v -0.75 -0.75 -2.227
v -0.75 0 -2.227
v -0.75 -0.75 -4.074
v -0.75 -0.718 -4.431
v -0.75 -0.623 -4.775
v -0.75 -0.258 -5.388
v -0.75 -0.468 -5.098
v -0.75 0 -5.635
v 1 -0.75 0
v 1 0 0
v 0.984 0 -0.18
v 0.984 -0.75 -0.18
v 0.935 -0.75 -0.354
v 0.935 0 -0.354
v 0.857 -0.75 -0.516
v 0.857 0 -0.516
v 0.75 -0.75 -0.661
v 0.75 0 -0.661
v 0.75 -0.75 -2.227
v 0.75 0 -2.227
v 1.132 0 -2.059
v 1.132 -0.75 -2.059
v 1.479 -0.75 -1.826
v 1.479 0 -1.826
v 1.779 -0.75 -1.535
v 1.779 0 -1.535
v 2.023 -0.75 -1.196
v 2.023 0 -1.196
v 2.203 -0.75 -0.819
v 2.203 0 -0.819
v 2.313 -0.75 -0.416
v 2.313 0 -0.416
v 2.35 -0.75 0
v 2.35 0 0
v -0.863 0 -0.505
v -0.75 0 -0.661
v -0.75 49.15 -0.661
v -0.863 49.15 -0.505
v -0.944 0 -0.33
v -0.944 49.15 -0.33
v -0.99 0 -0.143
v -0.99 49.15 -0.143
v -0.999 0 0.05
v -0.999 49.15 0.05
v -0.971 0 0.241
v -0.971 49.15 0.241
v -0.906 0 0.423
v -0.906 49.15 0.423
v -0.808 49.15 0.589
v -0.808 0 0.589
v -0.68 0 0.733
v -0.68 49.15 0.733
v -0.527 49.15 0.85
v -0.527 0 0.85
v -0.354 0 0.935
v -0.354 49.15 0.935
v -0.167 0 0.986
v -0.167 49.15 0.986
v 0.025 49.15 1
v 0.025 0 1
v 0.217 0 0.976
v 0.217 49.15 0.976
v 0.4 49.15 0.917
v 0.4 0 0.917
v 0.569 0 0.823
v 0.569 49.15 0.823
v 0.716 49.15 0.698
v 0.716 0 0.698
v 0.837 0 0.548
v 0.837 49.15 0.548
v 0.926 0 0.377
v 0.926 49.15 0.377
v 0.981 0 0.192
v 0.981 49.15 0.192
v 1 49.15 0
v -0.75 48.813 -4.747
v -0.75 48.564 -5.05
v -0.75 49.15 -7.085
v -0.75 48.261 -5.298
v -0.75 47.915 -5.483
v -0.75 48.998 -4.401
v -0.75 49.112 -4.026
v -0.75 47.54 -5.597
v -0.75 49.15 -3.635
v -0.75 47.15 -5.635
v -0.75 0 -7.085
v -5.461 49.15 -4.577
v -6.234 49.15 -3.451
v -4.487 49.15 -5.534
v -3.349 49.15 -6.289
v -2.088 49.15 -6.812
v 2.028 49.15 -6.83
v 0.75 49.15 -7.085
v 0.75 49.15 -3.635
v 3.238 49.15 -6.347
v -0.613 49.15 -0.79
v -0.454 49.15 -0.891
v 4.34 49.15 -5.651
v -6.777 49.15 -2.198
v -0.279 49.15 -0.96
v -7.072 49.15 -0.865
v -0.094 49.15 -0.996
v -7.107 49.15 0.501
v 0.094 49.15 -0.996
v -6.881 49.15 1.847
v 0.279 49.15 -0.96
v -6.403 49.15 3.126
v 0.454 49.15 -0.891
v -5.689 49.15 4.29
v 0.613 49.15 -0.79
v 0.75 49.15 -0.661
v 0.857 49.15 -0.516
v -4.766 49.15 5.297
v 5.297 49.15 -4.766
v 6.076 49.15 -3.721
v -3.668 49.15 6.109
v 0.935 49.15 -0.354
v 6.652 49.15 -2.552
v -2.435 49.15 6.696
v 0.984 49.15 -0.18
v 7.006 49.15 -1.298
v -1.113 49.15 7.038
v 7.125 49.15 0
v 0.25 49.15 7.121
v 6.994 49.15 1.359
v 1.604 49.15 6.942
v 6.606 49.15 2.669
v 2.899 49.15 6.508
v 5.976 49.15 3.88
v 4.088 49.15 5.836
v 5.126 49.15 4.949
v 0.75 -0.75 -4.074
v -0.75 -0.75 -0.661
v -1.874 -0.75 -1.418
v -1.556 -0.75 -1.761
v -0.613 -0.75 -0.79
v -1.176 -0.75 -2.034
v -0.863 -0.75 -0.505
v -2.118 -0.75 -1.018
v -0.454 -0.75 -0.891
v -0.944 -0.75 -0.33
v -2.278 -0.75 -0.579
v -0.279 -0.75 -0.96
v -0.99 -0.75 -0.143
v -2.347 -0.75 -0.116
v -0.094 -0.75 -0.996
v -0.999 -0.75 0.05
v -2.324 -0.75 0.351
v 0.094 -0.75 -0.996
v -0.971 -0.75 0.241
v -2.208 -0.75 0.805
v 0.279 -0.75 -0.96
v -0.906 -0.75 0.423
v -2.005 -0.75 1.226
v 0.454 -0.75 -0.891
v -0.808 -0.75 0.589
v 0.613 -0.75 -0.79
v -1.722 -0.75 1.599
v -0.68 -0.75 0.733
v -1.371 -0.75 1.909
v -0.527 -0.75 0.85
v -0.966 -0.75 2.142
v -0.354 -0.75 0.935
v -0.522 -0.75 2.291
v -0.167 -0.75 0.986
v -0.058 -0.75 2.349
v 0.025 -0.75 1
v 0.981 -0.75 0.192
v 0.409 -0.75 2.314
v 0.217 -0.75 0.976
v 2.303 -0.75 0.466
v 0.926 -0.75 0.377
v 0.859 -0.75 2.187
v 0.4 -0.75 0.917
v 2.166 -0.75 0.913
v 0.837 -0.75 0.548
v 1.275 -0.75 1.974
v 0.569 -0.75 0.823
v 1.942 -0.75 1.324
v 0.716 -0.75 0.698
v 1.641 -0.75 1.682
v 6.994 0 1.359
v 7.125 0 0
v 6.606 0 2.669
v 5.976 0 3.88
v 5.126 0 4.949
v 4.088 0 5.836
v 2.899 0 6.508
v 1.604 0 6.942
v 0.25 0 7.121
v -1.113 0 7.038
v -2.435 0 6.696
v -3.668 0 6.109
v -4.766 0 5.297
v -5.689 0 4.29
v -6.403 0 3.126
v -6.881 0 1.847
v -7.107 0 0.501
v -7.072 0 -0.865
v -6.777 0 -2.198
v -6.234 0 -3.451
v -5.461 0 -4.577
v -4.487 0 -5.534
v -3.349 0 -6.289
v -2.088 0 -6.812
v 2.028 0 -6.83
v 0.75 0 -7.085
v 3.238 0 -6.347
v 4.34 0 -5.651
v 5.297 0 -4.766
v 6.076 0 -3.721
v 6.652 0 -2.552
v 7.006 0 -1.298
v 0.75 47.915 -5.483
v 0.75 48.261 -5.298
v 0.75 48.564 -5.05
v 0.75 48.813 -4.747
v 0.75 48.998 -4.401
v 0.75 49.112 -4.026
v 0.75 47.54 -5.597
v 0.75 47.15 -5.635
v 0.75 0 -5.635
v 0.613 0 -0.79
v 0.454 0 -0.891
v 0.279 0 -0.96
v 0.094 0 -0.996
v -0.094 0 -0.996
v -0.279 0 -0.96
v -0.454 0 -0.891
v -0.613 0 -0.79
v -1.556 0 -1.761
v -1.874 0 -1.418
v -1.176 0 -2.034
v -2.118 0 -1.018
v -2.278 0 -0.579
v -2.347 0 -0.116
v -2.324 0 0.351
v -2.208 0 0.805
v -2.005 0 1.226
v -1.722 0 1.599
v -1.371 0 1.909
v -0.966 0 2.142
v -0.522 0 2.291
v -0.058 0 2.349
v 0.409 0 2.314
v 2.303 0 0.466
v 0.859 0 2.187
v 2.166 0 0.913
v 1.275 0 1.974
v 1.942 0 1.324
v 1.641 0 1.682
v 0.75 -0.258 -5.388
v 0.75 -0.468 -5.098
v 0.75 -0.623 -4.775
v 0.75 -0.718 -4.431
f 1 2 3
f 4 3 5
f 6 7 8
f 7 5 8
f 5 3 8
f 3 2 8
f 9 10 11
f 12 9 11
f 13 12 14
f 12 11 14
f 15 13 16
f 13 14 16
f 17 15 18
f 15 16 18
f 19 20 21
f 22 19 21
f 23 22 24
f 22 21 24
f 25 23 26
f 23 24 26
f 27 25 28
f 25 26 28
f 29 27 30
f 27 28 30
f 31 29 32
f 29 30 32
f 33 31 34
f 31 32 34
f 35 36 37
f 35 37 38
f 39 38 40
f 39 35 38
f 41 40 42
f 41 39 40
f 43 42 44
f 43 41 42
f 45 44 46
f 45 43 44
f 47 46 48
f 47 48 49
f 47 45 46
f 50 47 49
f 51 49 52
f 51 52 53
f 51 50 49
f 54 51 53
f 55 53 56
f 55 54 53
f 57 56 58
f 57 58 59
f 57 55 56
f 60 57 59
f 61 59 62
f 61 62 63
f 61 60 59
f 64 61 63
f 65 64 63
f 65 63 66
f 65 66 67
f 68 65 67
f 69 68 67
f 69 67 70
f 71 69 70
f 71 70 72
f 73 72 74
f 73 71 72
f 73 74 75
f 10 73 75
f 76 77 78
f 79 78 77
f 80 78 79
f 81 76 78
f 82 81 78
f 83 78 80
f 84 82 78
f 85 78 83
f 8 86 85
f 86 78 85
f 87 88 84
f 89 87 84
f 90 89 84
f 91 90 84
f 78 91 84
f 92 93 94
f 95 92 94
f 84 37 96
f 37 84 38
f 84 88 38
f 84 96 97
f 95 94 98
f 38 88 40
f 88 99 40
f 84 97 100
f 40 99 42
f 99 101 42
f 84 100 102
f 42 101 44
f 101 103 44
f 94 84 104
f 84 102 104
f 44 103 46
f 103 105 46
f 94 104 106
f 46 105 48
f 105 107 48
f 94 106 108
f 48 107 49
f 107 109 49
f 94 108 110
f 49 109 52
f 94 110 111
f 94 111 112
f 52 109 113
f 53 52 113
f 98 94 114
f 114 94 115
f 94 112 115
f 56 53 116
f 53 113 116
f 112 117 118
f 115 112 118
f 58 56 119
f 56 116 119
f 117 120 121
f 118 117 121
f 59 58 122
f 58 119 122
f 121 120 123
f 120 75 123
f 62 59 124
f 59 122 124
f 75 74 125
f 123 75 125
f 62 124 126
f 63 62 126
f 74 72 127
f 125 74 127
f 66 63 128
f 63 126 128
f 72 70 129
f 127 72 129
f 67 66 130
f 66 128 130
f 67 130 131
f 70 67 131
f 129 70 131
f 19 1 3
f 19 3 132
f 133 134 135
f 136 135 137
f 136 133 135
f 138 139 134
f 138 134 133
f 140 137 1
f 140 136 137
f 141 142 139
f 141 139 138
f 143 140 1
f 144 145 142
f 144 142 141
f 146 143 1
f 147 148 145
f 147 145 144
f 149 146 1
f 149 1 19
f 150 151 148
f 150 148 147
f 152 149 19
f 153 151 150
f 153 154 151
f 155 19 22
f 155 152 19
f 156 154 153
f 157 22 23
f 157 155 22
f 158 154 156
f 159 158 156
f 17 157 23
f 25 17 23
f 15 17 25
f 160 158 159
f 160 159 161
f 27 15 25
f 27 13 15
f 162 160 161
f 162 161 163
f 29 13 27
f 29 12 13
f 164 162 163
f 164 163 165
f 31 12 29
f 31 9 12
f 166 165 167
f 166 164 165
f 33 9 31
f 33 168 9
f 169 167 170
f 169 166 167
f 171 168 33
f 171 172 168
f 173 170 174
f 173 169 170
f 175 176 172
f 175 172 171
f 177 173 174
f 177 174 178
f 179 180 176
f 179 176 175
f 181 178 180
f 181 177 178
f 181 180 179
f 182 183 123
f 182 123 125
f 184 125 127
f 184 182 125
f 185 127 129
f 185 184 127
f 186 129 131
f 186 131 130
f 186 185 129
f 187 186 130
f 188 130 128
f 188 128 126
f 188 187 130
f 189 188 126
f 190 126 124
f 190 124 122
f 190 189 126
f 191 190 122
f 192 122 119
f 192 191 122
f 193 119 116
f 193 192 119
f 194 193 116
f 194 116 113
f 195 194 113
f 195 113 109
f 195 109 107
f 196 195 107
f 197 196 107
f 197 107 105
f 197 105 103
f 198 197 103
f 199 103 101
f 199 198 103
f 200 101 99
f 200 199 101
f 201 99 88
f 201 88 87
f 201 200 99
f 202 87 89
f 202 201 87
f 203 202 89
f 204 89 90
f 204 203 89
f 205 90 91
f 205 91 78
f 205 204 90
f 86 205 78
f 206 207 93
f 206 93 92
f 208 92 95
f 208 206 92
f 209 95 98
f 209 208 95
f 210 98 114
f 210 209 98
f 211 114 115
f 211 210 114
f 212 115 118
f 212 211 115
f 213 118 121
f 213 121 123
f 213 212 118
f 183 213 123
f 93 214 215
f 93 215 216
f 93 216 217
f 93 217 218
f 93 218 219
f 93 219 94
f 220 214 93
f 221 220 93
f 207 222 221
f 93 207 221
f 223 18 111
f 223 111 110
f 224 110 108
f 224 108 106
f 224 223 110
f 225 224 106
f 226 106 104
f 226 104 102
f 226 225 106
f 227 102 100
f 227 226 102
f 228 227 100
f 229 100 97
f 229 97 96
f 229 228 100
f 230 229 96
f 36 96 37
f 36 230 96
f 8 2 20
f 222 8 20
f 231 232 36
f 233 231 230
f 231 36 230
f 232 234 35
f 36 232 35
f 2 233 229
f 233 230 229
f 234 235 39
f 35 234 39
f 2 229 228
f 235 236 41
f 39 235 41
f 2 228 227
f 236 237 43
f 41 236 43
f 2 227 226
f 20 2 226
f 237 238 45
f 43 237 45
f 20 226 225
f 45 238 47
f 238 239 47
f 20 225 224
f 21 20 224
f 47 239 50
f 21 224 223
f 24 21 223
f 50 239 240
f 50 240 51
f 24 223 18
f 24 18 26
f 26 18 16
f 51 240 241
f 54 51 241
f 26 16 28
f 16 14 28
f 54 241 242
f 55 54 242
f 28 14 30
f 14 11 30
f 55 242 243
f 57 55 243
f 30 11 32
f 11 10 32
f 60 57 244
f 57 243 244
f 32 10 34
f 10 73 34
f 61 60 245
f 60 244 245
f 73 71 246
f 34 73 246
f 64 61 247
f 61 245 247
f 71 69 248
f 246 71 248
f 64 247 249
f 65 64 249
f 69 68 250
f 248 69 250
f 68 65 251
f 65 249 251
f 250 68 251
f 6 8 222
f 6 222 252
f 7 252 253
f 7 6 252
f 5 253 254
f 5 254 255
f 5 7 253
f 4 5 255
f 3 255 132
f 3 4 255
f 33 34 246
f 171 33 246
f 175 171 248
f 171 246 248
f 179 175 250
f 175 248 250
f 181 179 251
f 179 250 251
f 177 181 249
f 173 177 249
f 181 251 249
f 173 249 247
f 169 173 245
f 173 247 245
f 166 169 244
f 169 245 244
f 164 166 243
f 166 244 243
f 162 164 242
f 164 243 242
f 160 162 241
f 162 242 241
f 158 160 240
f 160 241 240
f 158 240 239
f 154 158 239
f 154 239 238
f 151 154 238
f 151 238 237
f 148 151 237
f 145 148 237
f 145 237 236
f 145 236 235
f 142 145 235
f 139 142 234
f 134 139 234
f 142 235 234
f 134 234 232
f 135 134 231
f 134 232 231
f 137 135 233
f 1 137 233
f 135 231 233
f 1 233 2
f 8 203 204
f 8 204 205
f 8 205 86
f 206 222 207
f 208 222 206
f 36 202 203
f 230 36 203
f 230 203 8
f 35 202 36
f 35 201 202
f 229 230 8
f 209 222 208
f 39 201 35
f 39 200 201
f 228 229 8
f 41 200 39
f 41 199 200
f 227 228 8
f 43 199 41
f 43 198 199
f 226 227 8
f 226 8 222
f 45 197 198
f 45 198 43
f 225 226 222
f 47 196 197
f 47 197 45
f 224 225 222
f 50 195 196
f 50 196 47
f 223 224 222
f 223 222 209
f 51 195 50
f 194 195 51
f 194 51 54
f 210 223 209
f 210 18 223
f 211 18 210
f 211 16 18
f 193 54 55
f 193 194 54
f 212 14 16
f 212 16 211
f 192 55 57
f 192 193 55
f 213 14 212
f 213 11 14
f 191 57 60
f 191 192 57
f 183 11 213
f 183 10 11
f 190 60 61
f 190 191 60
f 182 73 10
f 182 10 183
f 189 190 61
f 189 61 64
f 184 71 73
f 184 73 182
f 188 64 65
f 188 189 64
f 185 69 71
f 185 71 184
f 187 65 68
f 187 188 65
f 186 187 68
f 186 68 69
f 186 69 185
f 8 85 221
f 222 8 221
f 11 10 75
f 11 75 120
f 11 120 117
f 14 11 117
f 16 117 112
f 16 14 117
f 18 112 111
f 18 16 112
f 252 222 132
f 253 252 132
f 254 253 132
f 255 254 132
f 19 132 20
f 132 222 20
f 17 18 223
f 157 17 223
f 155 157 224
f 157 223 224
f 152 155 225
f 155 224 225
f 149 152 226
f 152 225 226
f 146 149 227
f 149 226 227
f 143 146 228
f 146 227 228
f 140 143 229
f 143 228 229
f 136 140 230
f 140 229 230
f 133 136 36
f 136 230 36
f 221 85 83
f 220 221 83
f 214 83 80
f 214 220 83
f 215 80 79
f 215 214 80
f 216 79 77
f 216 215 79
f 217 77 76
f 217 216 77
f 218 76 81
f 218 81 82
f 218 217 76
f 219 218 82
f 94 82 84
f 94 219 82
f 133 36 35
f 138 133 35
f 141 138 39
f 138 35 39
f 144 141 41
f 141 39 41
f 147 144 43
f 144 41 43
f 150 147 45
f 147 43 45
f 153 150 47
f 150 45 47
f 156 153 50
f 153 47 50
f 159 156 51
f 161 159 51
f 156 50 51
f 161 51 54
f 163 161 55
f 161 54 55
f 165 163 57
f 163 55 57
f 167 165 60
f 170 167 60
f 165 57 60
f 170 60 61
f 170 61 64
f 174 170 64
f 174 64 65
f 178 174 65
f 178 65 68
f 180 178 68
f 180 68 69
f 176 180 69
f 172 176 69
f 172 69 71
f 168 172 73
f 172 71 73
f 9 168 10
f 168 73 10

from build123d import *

# Parameters (mm, degrees)
F1_DEPTH    = 49.15
F2_DEPTH    = 0.75
F3_T1_DEPTH = 9.306247498
F4_R        = 2


# Not quite as in the source:
# - a fillet or chamfer that OpenCascade refuses, or shapes differently, is made with other operations: its cross-section is extruded or revolved along the edge and cut away or added


with BuildPart() as f1:
    # F0 (on Front) → F1 (new body)
    with BuildSketch(Plane.XZ):
        with BuildLine():
            ThreePointArc((0.75, -7.0854163604), (5.2966675844, -4.7655993852), (7.125, 0))
            ThreePointArc((7.125, 0), (-4.7655993852, 5.2966675844), (-0.75, -7.0854163604))
            Line((-0.75, -7.0854163604), (-0.75, -5.6354163604))
            Line((-0.75, -5.6354163604), (-0.75, -2.2271057451))
            ThreePointArc((-0.75, -2.2271057451), (-1.3711309201, 1.9085334684), (2.35, 0))
            ThreePointArc((2.35, 0), (1.9085334684, -1.3711309201), (0.75, -2.2271057451))
            Line((0.75, -2.2271057451), (0.75, -5.6354163604))
            Line((0.75, -5.6354163604), (0.75, -7.0854163604))
        make_face()
        with BuildLine():
            Line((-0.75, -2.2271057451), (-0.75, -5.6354163604))
            Line((-0.75, -5.6354163604), (0.75, -5.6354163604))
            Line((0.75, -5.6354163604), (0.75, -2.2271057451))
            ThreePointArc((0.75, -2.2271057451), (0, -2.35), (-0.75, -2.2271057451))
        make_face()
        with BuildLine():
            ThreePointArc((2.35, 0), (-1.3711309201, 1.9085334684), (-0.75, -2.2271057451))
            Line((-0.75, -2.2271057451), (-0.75, -0.6614378278))
            ThreePointArc((-0.75, -0.6614378278), (-0.3535533906, 0.9354143467), (1, 0))
            ThreePointArc((1, 0), (0.9354143467, -0.3535533906), (0.75, -0.6614378278))
            Line((0.75, -0.6614378278), (0.75, -2.2271057451))
            ThreePointArc((0.75, -2.2271057451), (1.9085334684, -1.3711309201), (2.35, 0))
        make_face()
        with BuildLine():
            Line((-0.75, -0.6614378278), (-0.75, -2.2271057451))
            ThreePointArc((-0.75, -2.2271057451), (0, -2.35), (0.75, -2.2271057451))
            Line((0.75, -2.2271057451), (0.75, -0.6614378278))
            ThreePointArc((0.75, -0.6614378278), (0, -1), (-0.75, -0.6614378278))
        make_face()
    extrude(amount=-F1_DEPTH)

    # F4
    f4_edges = [f1.edges().sort_by_distance(p)[0] for p in [
        (0, 49.15, -5.635416),
    ]]
    fillet(f4_edges, radius=F4_R)


with BuildPart() as f2:
    # F0 (on Front) → F2 (new body)
    with BuildSketch(Plane.XZ):
        with BuildLine():
            ThreePointArc((2.35, 0), (-1.3711309201, 1.9085334684), (-0.75, -2.2271057451))
            Line((-0.75, -2.2271057451), (-0.75, -0.6614378278))
            ThreePointArc((-0.75, -0.6614378278), (-0.3535533906, 0.9354143467), (1, 0))
            ThreePointArc((1, 0), (0.9354143467, -0.3535533906), (0.75, -0.6614378278))
            Line((0.75, -0.6614378278), (0.75, -2.2271057451))
            ThreePointArc((0.75, -2.2271057451), (1.9085334684, -1.3711309201), (2.35, 0))
        make_face()
        with BuildLine():
            Line((-0.75, -0.6614378278), (-0.75, -2.2271057451))
            ThreePointArc((-0.75, -2.2271057451), (0, -2.35), (0.75, -2.2271057451))
            Line((0.75, -2.2271057451), (0.75, -0.6614378278))
            ThreePointArc((0.75, -0.6614378278), (0, -1), (-0.75, -0.6614378278))
        make_face()
        with BuildLine():
            Line((-0.75, -2.2271057451), (-0.75, -5.6354163604))
            Line((-0.75, -5.6354163604), (0.75, -5.6354163604))
            Line((0.75, -5.6354163604), (0.75, -2.2271057451))
            ThreePointArc((0.75, -2.2271057451), (0, -2.35), (-0.75, -2.2271057451))
        make_face()
    extrude(amount=F2_DEPTH)

    # F3: fillet of radius 2 on 1 edges, made by hand

    # F3_s2 → F3_t1 (cut)
    with BuildSketch(Plane.YZ.offset(-4.653123749)):
        with BuildLine():
            ThreePointArc((0, -5.6354163604), (-0.5527756377, -4.9401922646), (-0.75, -4.0741668608))
            Line((-0.75, -4.0741668608), (-0.75, -5.6354163604))
            Line((-0.75, -5.6354163604), (0, -5.6354163604))
        make_face()
    extrude(amount=F3_T1_DEPTH, mode=Mode.SUBTRACT)


solid = Compound([f1.part, f2.part])
